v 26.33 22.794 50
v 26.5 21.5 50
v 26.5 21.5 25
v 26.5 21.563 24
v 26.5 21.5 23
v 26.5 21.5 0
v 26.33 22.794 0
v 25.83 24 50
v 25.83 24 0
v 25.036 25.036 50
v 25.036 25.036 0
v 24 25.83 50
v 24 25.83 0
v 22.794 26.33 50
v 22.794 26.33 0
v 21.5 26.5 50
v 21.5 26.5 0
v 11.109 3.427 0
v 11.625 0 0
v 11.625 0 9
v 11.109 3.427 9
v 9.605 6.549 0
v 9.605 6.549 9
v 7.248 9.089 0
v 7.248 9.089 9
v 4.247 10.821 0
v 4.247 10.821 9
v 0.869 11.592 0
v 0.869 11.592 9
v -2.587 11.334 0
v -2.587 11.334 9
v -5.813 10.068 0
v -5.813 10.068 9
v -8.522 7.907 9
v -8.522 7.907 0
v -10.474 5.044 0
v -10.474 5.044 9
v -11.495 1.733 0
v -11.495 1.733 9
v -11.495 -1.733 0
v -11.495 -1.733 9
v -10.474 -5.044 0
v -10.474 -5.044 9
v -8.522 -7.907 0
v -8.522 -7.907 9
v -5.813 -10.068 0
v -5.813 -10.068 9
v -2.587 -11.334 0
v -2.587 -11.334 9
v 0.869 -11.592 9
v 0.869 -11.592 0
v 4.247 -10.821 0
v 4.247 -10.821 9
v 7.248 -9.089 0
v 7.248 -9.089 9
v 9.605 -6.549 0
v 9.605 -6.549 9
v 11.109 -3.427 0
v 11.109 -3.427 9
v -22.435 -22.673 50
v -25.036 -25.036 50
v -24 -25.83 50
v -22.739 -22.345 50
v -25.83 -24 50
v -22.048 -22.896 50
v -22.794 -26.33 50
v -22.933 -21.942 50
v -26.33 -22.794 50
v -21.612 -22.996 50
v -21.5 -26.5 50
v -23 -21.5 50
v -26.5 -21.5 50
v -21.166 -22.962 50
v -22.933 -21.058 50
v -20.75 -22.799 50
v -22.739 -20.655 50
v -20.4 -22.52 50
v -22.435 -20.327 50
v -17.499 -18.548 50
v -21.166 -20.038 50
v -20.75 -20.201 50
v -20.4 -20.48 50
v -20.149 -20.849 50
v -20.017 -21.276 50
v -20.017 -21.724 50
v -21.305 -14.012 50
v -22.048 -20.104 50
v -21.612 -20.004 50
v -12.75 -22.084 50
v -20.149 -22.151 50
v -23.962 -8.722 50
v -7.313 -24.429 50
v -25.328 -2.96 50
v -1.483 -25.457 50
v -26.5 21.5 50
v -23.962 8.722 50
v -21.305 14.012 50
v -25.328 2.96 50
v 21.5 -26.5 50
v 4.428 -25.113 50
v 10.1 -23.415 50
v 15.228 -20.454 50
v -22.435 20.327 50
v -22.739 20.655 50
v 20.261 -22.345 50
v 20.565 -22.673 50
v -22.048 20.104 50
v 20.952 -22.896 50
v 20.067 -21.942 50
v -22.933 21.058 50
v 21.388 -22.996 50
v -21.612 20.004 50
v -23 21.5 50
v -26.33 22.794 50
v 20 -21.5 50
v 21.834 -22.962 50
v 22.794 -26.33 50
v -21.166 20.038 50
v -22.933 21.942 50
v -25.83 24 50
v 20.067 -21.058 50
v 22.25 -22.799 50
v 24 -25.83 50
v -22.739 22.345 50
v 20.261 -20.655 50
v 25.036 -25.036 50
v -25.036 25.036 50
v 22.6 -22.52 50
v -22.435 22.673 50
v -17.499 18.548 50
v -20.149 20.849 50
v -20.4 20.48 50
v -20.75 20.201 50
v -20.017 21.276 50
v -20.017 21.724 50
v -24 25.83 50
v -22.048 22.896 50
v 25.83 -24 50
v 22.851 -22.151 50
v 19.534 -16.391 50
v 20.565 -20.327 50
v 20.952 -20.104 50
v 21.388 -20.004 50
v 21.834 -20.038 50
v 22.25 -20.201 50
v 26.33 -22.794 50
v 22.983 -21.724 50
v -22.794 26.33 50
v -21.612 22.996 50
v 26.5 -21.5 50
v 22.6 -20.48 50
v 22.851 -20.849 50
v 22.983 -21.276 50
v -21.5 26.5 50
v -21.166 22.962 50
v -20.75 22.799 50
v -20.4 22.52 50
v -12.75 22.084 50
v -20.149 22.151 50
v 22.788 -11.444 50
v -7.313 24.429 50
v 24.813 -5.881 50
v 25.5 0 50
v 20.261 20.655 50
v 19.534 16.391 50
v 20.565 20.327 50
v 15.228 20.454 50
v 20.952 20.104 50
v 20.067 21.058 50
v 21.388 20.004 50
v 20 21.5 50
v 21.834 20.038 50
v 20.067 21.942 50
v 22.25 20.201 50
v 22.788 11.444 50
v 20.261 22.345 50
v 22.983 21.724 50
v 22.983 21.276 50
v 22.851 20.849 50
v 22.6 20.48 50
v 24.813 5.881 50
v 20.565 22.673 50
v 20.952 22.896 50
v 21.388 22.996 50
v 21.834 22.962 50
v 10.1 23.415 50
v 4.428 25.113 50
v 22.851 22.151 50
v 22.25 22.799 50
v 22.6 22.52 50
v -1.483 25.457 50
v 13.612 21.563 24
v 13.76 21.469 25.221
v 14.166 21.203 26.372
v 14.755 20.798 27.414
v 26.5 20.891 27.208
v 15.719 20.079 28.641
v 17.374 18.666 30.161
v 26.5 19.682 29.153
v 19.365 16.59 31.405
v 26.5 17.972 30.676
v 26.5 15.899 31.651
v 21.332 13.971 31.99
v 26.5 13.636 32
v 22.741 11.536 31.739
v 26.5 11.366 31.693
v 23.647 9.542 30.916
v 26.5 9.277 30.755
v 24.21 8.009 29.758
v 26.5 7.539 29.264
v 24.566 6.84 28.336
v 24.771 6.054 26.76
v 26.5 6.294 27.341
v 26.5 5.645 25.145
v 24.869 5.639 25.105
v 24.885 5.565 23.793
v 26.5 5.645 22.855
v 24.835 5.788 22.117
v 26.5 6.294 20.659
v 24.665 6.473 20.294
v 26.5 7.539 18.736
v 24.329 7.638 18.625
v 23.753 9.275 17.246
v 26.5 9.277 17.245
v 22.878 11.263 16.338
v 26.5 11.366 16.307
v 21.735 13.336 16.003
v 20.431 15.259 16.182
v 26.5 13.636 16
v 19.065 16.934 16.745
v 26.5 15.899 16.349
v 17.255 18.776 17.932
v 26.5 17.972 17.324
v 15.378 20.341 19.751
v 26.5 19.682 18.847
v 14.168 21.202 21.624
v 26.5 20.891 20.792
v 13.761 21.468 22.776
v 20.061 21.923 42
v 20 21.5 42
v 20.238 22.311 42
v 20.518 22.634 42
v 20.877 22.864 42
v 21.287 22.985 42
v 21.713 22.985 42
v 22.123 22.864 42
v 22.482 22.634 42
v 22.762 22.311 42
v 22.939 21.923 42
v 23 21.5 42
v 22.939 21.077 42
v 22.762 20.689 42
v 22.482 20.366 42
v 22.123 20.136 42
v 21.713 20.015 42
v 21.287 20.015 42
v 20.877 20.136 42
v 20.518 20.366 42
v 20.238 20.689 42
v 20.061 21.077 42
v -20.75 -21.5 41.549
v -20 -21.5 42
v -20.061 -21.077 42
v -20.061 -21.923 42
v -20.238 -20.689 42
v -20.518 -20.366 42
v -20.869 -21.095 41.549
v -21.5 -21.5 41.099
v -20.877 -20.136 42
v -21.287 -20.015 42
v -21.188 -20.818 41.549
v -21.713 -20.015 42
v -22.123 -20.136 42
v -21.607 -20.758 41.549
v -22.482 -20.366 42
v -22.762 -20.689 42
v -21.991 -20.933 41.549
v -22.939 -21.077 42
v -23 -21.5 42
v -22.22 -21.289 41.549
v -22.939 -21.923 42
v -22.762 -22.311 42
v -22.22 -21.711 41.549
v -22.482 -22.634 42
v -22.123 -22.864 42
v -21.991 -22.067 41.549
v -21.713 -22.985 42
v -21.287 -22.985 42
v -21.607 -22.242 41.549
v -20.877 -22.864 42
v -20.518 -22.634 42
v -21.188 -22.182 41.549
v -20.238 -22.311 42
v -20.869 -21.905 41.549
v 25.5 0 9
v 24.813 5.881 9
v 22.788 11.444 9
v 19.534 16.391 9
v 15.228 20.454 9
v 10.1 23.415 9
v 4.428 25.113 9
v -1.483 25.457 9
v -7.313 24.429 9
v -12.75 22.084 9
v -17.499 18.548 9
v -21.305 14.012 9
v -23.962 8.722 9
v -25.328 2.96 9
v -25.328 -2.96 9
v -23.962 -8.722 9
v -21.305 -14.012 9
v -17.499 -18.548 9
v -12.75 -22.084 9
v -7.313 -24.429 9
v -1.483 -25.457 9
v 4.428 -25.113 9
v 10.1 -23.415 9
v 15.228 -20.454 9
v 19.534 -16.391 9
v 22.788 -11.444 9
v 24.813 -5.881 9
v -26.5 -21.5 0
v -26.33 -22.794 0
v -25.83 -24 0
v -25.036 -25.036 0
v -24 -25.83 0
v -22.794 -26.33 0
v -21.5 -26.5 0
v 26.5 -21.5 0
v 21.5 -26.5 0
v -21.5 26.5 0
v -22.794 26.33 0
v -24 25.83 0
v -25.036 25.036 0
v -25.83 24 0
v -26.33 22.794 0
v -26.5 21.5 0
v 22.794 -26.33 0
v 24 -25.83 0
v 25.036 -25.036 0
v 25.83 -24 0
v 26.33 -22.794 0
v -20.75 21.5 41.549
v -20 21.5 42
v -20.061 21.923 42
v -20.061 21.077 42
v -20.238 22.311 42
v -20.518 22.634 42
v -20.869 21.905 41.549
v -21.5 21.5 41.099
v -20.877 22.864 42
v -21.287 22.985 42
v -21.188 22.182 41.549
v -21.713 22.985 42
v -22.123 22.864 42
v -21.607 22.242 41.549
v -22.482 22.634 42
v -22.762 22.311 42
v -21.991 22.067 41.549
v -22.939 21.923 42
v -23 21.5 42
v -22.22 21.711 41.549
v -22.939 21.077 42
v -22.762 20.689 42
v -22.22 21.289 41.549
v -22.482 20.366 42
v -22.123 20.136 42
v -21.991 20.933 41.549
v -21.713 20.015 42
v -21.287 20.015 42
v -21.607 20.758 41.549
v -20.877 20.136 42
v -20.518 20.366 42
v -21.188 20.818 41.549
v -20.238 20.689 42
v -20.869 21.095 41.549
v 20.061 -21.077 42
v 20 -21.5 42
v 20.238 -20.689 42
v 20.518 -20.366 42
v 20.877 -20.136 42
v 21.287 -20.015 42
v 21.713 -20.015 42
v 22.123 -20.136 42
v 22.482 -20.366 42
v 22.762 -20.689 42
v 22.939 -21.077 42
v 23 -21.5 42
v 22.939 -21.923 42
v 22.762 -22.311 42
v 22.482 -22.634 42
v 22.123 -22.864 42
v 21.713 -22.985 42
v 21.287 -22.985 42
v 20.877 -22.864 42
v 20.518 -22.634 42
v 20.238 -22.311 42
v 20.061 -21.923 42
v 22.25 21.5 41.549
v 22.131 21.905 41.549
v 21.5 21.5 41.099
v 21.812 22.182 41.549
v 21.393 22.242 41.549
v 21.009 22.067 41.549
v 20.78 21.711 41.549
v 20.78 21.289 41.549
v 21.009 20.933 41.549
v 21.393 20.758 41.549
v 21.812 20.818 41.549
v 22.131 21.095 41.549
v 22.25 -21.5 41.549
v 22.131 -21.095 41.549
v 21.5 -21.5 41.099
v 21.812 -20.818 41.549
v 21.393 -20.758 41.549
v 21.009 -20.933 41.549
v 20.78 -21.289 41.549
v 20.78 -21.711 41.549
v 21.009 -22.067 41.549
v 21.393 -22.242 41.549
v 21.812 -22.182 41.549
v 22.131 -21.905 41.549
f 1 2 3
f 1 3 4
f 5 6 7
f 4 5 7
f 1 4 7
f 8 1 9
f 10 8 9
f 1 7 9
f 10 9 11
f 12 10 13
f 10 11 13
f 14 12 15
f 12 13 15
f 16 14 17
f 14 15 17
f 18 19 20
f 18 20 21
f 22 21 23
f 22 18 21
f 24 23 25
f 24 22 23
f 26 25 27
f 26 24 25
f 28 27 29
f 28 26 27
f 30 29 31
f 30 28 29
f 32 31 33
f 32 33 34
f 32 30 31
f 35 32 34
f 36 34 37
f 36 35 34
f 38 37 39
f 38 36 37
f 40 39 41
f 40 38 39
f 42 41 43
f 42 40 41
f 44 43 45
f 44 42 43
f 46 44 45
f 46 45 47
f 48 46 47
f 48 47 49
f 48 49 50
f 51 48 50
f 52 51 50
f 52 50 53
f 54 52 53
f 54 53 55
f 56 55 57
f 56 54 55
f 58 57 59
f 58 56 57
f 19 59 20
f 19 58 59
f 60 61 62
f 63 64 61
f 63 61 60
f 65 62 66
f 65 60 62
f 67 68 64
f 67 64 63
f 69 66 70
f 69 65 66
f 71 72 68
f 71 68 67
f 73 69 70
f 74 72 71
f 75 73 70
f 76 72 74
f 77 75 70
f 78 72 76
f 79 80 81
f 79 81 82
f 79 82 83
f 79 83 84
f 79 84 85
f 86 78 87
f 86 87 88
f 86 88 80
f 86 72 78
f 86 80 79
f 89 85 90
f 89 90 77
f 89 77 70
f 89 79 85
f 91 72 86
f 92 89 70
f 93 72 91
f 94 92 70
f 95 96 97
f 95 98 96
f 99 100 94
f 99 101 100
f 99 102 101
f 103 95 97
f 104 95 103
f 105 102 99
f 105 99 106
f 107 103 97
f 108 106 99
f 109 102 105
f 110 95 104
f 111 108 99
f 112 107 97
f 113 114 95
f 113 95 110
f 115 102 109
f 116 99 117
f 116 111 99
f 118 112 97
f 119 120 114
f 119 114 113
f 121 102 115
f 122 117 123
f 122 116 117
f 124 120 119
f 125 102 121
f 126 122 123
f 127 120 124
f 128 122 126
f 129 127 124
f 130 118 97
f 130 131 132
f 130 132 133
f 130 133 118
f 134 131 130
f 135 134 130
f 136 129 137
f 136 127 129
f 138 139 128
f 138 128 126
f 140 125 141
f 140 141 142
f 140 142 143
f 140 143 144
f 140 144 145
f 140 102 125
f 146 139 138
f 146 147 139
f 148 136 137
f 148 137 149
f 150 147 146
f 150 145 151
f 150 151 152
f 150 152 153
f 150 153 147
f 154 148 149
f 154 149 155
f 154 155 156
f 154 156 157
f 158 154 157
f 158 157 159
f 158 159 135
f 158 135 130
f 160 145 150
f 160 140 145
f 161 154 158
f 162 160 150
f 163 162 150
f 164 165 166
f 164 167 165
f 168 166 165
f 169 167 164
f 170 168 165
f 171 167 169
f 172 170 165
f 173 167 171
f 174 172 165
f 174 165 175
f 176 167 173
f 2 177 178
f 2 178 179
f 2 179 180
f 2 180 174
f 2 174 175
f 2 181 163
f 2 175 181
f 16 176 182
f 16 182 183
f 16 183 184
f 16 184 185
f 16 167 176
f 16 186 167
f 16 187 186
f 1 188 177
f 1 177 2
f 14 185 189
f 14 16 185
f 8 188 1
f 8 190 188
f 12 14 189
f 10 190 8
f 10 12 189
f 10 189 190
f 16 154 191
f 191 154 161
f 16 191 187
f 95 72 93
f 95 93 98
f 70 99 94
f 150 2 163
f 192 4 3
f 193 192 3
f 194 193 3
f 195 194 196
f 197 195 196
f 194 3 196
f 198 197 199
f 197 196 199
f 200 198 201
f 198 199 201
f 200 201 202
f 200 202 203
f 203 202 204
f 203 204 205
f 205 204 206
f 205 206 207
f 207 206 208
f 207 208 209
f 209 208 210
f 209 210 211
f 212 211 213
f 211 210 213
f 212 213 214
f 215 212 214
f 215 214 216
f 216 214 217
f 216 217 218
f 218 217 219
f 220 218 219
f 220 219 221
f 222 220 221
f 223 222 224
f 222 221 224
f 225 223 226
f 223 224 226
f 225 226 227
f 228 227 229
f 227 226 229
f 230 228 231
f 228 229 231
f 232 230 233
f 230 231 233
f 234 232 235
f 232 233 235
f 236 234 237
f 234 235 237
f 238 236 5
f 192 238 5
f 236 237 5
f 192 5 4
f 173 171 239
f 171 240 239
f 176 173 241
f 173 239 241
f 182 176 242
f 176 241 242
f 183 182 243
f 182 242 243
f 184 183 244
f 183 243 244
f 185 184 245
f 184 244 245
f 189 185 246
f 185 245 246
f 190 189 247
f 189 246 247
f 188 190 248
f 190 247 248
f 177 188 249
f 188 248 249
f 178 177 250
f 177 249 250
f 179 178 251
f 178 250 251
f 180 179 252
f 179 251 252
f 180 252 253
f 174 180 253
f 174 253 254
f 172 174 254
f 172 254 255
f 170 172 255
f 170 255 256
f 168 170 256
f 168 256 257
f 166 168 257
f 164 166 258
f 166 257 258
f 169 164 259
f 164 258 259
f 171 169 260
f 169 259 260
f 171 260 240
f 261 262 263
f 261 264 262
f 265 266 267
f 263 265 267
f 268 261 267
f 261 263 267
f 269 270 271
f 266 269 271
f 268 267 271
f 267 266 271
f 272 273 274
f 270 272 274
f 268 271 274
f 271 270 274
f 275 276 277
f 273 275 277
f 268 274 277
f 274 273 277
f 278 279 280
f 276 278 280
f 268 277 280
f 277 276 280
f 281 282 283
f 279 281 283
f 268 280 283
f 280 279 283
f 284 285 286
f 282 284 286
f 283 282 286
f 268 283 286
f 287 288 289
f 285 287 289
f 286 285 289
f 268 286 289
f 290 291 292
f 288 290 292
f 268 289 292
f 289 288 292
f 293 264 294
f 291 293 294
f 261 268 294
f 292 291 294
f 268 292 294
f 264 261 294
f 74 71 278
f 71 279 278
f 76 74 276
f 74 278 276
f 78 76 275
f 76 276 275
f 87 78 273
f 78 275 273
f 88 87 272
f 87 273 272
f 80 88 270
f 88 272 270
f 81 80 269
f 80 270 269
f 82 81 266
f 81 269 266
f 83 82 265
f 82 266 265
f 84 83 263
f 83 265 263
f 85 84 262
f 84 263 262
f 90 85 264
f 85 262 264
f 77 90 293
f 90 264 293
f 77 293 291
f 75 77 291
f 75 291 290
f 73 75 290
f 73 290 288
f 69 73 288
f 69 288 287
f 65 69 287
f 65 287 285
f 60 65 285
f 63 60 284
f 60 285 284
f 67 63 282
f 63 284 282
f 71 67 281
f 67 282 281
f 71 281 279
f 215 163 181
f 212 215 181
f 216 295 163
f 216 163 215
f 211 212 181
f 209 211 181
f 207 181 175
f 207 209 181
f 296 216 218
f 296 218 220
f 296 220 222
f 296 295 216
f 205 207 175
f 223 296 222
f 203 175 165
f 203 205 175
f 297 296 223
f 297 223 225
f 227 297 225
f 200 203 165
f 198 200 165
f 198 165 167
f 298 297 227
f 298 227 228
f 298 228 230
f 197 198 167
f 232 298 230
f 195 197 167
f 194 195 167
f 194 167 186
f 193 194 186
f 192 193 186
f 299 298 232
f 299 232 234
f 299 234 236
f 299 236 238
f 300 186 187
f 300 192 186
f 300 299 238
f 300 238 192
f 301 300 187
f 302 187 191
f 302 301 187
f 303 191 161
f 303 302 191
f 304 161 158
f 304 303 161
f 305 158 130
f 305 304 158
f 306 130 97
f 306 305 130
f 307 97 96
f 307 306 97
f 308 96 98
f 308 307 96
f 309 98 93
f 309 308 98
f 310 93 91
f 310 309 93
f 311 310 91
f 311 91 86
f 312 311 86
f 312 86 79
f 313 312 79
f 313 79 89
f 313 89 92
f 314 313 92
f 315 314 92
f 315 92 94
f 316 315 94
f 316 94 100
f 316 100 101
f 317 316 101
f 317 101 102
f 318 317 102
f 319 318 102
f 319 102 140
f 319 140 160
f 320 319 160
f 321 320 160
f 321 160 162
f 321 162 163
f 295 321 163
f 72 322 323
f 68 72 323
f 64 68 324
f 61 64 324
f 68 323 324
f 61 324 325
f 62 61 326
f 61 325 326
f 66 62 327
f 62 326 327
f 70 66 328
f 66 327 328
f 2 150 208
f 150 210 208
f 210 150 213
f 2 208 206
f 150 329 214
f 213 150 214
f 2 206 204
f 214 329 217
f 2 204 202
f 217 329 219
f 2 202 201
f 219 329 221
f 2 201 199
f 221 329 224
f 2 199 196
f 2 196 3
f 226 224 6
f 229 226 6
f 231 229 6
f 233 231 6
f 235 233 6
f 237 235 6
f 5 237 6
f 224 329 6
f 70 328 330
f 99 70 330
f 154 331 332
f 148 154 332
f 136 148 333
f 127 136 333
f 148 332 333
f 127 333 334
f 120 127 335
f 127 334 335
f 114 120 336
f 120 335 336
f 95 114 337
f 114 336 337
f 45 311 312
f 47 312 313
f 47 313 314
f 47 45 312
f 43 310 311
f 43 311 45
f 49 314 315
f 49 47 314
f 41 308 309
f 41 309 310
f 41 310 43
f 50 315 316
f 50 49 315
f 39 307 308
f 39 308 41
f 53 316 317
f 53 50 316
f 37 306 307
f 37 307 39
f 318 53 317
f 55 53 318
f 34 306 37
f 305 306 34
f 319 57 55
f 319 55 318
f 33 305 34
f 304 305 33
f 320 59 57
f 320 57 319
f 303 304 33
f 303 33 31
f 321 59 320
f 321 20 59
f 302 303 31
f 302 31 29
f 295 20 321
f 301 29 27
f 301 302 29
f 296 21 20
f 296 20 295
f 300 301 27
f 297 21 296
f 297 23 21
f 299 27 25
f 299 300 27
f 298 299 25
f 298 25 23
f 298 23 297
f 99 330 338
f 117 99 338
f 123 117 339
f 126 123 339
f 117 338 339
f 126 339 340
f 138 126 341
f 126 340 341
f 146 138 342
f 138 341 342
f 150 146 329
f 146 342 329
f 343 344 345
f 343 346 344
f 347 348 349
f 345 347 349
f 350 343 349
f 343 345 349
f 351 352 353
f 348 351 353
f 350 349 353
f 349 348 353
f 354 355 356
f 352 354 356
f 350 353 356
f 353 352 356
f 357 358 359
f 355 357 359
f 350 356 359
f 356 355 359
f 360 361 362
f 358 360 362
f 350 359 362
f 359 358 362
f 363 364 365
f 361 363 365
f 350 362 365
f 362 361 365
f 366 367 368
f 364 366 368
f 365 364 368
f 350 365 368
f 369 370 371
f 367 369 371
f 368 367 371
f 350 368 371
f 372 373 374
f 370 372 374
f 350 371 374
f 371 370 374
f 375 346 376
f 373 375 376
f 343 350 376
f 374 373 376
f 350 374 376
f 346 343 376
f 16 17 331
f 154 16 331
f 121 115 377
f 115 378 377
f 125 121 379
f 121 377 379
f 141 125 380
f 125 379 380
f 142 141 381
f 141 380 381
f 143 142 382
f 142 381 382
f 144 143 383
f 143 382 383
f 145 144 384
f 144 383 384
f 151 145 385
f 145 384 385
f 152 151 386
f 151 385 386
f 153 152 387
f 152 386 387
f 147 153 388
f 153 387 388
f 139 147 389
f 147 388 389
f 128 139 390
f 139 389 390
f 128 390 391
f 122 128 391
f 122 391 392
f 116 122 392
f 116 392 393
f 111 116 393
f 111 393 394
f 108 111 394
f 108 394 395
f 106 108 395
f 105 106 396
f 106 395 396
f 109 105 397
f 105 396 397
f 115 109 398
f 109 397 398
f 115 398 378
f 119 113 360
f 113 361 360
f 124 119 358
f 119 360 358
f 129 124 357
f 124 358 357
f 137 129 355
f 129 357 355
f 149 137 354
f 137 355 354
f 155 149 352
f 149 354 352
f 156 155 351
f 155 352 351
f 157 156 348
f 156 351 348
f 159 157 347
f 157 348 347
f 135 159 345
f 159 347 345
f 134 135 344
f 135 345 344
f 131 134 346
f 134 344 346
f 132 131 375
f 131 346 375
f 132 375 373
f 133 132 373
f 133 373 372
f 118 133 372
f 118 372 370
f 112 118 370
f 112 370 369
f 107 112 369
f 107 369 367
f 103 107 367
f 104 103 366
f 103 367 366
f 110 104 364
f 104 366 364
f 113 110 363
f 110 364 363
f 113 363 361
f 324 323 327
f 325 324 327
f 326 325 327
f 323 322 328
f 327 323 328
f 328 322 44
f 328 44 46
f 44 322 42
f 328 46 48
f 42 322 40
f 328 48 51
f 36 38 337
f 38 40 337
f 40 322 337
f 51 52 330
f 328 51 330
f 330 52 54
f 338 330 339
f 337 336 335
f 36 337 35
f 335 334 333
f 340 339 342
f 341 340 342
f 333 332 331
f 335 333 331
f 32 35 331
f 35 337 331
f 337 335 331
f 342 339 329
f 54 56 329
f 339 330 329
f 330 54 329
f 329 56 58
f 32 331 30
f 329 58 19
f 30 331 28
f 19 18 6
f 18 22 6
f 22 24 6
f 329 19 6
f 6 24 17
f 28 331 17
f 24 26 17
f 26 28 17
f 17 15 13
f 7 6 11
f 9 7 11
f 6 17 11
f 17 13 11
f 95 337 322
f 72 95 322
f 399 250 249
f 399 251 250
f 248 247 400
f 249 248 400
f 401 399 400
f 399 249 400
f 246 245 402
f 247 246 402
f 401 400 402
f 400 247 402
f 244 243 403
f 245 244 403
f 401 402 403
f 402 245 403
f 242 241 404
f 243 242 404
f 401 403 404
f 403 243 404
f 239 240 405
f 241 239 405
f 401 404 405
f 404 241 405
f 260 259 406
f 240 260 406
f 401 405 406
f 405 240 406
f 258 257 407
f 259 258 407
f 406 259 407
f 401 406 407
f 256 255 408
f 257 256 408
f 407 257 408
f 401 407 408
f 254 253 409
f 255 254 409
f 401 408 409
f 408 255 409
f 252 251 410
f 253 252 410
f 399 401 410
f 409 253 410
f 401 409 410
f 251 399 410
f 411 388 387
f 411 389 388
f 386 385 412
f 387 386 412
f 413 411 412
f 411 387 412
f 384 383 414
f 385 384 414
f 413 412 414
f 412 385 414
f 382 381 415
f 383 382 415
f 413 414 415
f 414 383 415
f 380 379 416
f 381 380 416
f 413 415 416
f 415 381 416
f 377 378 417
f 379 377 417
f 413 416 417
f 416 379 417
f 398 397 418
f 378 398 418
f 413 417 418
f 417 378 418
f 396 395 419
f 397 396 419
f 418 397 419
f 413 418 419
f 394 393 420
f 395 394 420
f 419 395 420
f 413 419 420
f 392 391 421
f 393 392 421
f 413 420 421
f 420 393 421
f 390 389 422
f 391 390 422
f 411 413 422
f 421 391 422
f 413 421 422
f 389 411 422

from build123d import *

# Parameters (mm, degrees)
F0_R     = 25.5
F1_DEPTH = 50
F0_R_2   = 11.625
F2_DEPTH = 9
F4_R     = 8
F5_DEPTH = 15
F8_D     = 3
F8_DEPTH = 8
F8_TIP   = 0.9012909285


with BuildPart() as f1:
    # F0 (on Top) → F1 (new body)
    with BuildSketch(Plane.XY):
        with BuildLine():
            Line((21.5, 26.5), (-21.5, 26.5))
            ThreePointArc((-21.5, 26.5), (-25.0355339059, 25.0355339059), (-26.5, 21.5))
            Line((-26.5, 21.5), (-26.5, -21.5))
            ThreePointArc((-26.5, -21.5), (-25.0355339059, -25.0355339059), (-21.5, -26.5))
            Line((-21.5, -26.5), (21.5, -26.5))
            ThreePointArc((21.5, -26.5), (25.0355339059, -25.0355339059), (26.5, -21.5))
            Line((26.5, -21.5), (26.5, 21.5))
            ThreePointArc((26.5, 21.5), (25.0355339059, 25.0355339059), (21.5, 26.5))
        make_face()
        Circle(F0_R, mode=Mode.SUBTRACT)
    extrude(amount=F1_DEPTH)

    # F0 (on Top) → F2 (join)
    with BuildSketch(Plane.XY):
        Circle(F0_R)
        Circle(F0_R_2, mode=Mode.SUBTRACT)
    extrude(amount=F2_DEPTH)

    # F4 (on offset) → F5 (cut)
    with BuildSketch(Plane.YZ.offset(26.5)):
        with Locations((13.5627460668, 24)):
            Circle(F4_R)
    extrude(amount=-F5_DEPTH, mode=Mode.SUBTRACT)

    # F8
    with Locations(Plane.XY.offset(50)):
        with Locations((-21.5, 21.5), (21.5, 21.5), (21.5, -21.5), (-21.5, -21.5)):
            Hole(F8_D / 2, depth=F8_DEPTH)
            with Locations((0, 0, -(F8_DEPTH + F8_TIP / 2))):  # 118° drill point
                Cone(0, F8_D / 2, F8_TIP, mode=Mode.SUBTRACT)


solid = f1.part
